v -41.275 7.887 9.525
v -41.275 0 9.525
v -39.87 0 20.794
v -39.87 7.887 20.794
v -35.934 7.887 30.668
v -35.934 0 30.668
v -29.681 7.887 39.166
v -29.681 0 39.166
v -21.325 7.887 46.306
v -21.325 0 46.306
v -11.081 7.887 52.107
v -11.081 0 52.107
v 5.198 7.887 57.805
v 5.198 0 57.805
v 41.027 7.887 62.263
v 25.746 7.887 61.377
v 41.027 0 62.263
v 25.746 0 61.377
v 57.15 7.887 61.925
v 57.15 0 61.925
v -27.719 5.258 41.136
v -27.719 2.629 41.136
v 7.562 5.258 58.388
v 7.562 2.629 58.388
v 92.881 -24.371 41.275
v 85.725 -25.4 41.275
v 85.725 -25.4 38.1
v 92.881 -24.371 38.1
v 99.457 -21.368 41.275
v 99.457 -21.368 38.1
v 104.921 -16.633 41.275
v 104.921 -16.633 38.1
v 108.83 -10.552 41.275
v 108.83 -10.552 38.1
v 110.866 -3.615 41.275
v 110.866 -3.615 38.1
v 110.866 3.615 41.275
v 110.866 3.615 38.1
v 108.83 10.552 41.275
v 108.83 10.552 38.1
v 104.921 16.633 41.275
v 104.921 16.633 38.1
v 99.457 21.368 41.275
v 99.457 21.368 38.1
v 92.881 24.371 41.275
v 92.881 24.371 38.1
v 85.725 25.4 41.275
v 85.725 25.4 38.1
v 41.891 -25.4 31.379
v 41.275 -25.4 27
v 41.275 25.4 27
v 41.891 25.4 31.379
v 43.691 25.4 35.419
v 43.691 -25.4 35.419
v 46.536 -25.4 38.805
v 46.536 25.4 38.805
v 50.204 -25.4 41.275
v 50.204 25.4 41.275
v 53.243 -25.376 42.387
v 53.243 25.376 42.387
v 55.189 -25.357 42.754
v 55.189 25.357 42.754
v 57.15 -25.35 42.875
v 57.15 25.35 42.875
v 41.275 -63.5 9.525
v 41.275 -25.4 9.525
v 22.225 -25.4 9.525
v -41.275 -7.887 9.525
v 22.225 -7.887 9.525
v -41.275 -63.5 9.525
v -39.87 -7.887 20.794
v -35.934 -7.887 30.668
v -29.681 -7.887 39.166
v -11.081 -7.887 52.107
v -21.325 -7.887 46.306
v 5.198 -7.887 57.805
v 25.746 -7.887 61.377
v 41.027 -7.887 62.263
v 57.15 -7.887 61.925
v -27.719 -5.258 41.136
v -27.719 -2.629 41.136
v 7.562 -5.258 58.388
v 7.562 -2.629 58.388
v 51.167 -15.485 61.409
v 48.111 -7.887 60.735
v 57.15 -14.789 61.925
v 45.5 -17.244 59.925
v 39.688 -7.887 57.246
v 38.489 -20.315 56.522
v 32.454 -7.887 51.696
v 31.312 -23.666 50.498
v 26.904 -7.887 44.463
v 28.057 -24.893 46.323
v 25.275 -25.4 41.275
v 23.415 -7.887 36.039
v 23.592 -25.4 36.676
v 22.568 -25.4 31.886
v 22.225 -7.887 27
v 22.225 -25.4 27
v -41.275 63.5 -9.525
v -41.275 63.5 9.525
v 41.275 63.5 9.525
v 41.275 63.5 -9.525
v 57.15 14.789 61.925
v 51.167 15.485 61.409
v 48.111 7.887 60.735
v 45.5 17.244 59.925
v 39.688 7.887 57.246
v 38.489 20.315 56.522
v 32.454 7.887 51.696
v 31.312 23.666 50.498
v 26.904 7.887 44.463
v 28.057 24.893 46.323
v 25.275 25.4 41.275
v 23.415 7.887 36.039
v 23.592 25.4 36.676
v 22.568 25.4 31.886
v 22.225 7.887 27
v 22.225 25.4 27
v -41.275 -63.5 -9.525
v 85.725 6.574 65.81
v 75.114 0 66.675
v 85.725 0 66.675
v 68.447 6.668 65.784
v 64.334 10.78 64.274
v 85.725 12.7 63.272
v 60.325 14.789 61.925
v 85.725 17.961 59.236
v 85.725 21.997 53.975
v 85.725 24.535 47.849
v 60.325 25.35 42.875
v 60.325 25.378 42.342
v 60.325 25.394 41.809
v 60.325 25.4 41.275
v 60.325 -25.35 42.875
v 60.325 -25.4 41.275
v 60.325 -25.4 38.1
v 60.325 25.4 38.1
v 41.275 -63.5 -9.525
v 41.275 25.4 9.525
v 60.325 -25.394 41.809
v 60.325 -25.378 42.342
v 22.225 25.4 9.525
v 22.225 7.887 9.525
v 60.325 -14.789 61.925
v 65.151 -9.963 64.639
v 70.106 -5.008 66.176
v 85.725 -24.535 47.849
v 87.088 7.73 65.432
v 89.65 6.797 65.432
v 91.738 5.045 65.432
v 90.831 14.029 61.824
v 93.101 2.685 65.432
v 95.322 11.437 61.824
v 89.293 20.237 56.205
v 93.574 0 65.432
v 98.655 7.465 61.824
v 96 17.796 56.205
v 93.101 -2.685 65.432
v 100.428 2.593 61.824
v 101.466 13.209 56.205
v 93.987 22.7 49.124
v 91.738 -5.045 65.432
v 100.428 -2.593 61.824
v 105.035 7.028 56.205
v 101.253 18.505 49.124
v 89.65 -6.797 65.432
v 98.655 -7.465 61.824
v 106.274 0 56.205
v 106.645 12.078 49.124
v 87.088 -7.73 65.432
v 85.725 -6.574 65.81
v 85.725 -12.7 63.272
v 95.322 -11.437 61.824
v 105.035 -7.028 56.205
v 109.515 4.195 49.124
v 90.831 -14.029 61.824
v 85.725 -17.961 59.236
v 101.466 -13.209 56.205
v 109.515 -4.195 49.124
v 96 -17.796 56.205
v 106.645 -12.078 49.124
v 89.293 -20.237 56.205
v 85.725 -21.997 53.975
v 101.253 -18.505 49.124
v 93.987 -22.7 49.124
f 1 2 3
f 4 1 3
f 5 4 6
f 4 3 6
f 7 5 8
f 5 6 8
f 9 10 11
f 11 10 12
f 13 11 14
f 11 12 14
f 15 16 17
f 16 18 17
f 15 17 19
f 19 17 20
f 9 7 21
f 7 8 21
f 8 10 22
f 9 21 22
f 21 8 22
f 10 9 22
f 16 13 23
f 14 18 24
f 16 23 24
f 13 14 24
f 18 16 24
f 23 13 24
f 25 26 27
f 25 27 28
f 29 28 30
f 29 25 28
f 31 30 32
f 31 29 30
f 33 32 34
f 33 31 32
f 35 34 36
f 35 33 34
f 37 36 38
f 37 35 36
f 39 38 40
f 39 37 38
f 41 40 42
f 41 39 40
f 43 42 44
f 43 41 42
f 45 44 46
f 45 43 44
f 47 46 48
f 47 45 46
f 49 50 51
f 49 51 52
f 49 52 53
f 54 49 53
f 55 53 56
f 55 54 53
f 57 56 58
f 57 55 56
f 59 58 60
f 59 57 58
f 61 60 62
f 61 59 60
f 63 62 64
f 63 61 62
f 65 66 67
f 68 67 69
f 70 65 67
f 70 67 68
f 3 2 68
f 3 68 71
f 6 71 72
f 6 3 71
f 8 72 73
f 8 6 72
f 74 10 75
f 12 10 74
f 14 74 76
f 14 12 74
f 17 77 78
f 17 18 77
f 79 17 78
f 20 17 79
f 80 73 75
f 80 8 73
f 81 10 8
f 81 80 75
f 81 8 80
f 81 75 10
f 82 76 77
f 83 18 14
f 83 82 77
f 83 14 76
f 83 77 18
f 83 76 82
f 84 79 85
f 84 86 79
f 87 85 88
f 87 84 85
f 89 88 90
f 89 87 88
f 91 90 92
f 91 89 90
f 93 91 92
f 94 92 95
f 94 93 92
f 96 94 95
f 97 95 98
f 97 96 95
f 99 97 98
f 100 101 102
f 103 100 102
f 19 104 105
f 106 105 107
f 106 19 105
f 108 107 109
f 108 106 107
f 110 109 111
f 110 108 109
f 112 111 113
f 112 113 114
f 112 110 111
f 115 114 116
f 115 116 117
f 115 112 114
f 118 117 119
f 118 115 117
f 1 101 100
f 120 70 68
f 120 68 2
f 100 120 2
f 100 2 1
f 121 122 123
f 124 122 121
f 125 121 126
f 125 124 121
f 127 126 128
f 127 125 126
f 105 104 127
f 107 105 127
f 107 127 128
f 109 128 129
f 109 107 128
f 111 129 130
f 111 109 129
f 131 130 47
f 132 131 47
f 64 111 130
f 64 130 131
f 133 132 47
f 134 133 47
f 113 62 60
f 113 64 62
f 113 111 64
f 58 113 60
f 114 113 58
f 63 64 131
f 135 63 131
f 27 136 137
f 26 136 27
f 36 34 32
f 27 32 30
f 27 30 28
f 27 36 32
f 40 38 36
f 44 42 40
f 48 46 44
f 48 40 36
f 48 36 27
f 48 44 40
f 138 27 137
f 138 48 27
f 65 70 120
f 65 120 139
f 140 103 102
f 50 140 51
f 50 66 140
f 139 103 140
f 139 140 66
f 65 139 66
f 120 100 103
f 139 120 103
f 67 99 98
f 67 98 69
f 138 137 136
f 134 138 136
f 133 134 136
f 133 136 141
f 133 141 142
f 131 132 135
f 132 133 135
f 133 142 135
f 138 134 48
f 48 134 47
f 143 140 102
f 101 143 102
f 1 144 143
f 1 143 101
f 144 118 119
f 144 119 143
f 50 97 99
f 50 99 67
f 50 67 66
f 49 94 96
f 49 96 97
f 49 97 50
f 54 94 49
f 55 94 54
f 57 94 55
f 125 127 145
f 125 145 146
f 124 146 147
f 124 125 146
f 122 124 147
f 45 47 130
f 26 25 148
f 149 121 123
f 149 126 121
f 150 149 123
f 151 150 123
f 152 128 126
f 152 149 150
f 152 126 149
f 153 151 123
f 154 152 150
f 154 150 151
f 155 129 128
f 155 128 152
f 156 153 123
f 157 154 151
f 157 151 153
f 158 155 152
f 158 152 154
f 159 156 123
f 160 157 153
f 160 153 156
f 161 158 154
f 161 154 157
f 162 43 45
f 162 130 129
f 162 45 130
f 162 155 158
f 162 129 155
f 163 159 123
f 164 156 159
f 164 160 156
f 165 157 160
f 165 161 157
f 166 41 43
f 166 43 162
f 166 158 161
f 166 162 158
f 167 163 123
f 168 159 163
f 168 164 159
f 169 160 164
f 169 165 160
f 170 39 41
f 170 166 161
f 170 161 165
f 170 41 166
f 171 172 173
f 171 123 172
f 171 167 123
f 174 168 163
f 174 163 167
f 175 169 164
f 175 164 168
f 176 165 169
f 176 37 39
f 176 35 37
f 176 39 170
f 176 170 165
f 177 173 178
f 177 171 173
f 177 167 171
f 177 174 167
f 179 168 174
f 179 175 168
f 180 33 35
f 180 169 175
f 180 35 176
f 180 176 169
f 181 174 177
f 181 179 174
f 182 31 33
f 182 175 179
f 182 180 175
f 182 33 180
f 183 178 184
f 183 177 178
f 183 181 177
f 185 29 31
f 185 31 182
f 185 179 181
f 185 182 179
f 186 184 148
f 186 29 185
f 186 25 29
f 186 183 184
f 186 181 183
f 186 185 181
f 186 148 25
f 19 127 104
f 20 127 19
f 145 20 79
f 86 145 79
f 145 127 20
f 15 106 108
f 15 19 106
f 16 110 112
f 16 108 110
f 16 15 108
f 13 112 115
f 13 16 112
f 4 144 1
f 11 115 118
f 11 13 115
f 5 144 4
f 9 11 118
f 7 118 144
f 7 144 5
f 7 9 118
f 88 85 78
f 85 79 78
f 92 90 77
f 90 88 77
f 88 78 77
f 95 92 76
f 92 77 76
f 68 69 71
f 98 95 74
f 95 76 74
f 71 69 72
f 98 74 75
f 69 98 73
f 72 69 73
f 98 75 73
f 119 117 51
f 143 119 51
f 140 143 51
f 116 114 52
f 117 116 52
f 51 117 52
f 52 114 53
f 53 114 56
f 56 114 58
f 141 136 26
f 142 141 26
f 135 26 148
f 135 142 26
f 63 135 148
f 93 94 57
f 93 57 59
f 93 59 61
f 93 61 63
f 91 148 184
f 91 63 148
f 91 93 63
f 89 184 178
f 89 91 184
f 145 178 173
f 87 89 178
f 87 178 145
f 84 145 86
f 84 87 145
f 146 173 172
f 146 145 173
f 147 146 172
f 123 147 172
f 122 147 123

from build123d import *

# Parameters (mm, degrees)
F1_DEPTH    = 63.5
F0_W        = 25.4
F0_H        = 19.05
F0_H_2      = 4.7498
F0_H_3      = 4.7752
F2_DEPTH    = 25.4
F3_DEPTH    = 7.8867
F5_T1_DEPTH = 124.7474881183
F5_T3_DEPTH = 88.9
F5_T6_ANGLE = 180


# Not quite as in the source:
# - a fillet or chamfer that OpenCascade refuses, or shapes differently, is made with other operations: its cross-section is extruded or revolved along the edge and cut away or added


with BuildPart() as f1:
    # F0 (on Front) → F1 (new body, symmetric)
    with BuildSketch(Plane.XZ):
        Polygon((22.225, 9.525), (-41.275, 9.525), (-41.275, -9.525), (41.275, -9.525), (41.275, 9.525), align=None)
    extrude(amount=F1_DEPTH, both=True)

    # F0 (on Front) → F2 (join, symmetric)
    with BuildSketch(Plane.XZ):
        with BuildLine():
            Line((22.225, 27.0002), (22.225, 9.525))
            Line((22.225, 9.525), (41.275, 9.525))
            Line((41.275, 9.525), (41.275, 27.0002))
            ThreePointArc((41.275, 27.0002), (45.9246798487, 38.2255201513), (57.15, 42.8752))
            Line((57.15, 42.8752), (60.325, 42.8752))
            Line((60.325, 42.8752), (60.325, 61.9252))
            Line((60.325, 61.9252), (57.15, 61.9252))
            ThreePointArc((57.15, 61.9252), (32.4542956671, 51.6959043329), (22.225, 27.0002))
        make_face()
        with Locations((73.025, 52.4002)):
            Rectangle(F0_W, F0_H)
        with Locations((73.025, 64.3001)):
            Rectangle(F0_W, F0_H_2)
        with Locations((73.025, 40.4876)):
            Rectangle(F0_W, F0_H_3)
    extrude(amount=F2_DEPTH, both=True)

    # F0 (on Front) → F3 (join, symmetric)
    with BuildSketch(Plane.XZ):
        with BuildLine():
            add(Edge.make_bspline(
                [(-41.275, 9.525), (-41.0557202995, 48.5295318067), (2.8826263733, 65.0303959846), (57.15, 61.9252)],
                knots=[0, 0, 0, 0, 111.5045361635, 111.5045361635, 111.5045361635, 111.5045361635], degree=3))
            Line((-41.275, 9.525), (22.225, 9.525))
            Line((22.225, 9.525), (22.225, 27.0002))
            ThreePointArc((22.225, 27.0002), (32.4542956671, 51.6959043329), (57.15, 61.9252))
        make_face()
    extrude(amount=F3_DEPTH, both=True)

    # F0 (on Front) → F4 (revolve)
    with BuildSketch(Plane.XZ):
        Polygon((85.725, 66.675), (85.725, 61.9252), (85.725, 42.8752), (85.725, 38.1), (111.125, 38.1), (111.125, 66.675), align=None)
    revolve(axis=Axis((85.725, 0, 52.3875), (0, 0, 1)))

    # F5: fillet of radius 25.4 on 4 edges, made by hand

    # F5_s2 → F5_t1 (cut)
    with BuildSketch(Plane.XZ.offset(-62.3737440591)):
        with BuildLine():
            ThreePointArc((60.325, 61.9252), (67.3477441191, 65.4584145645), (75.1144976237, 66.675))
            Line((75.1144976237, 66.675), (60.325, 66.675))
            Line((60.325, 66.675), (60.325, 61.9252))
        make_face()
    extrude(amount=F5_T1_DEPTH, mode=Mode.SUBTRACT)

    # F5_s4 → F5_t3 (cut)
    with BuildSketch(Plane.YZ.offset(-3.175)):
        with BuildLine():
            ThreePointArc((-25.4, 41.275), (-17.9605122421, 59.2355122421), (0, 66.675))
            Line((0, 66.675), (-25.4, 66.675))
            Line((-25.4, 66.675), (-25.4, 41.275))
        make_face()
        with BuildLine():
            ThreePointArc((0, 66.675), (17.9605122421, 59.2355122421), (25.4, 41.275))
            Line((25.4, 41.275), (25.4, 66.675))
            Line((25.4, 66.675), (0, 66.675))
        make_face()
    extrude(amount=F5_T3_DEPTH, mode=Mode.SUBTRACT)

    # F5_s5 → F5_t6 (revolve, cut)
    with BuildSketch(Plane.YZ.offset(85.725)):
        with BuildLine():
            ThreePointArc((0, 66.675), (17.9605122421, 59.2355122421), (25.4, 41.275))
            Line((25.4, 41.275), (25.4, 66.675))
            Line((25.4, 66.675), (0, 66.675))
        make_face()
    revolve(axis=Axis((85.725, 0, 66.675), (0, 0, -1)), revolution_arc=F5_T6_ANGLE, mode=Mode.SUBTRACT)


solid = f1.part
